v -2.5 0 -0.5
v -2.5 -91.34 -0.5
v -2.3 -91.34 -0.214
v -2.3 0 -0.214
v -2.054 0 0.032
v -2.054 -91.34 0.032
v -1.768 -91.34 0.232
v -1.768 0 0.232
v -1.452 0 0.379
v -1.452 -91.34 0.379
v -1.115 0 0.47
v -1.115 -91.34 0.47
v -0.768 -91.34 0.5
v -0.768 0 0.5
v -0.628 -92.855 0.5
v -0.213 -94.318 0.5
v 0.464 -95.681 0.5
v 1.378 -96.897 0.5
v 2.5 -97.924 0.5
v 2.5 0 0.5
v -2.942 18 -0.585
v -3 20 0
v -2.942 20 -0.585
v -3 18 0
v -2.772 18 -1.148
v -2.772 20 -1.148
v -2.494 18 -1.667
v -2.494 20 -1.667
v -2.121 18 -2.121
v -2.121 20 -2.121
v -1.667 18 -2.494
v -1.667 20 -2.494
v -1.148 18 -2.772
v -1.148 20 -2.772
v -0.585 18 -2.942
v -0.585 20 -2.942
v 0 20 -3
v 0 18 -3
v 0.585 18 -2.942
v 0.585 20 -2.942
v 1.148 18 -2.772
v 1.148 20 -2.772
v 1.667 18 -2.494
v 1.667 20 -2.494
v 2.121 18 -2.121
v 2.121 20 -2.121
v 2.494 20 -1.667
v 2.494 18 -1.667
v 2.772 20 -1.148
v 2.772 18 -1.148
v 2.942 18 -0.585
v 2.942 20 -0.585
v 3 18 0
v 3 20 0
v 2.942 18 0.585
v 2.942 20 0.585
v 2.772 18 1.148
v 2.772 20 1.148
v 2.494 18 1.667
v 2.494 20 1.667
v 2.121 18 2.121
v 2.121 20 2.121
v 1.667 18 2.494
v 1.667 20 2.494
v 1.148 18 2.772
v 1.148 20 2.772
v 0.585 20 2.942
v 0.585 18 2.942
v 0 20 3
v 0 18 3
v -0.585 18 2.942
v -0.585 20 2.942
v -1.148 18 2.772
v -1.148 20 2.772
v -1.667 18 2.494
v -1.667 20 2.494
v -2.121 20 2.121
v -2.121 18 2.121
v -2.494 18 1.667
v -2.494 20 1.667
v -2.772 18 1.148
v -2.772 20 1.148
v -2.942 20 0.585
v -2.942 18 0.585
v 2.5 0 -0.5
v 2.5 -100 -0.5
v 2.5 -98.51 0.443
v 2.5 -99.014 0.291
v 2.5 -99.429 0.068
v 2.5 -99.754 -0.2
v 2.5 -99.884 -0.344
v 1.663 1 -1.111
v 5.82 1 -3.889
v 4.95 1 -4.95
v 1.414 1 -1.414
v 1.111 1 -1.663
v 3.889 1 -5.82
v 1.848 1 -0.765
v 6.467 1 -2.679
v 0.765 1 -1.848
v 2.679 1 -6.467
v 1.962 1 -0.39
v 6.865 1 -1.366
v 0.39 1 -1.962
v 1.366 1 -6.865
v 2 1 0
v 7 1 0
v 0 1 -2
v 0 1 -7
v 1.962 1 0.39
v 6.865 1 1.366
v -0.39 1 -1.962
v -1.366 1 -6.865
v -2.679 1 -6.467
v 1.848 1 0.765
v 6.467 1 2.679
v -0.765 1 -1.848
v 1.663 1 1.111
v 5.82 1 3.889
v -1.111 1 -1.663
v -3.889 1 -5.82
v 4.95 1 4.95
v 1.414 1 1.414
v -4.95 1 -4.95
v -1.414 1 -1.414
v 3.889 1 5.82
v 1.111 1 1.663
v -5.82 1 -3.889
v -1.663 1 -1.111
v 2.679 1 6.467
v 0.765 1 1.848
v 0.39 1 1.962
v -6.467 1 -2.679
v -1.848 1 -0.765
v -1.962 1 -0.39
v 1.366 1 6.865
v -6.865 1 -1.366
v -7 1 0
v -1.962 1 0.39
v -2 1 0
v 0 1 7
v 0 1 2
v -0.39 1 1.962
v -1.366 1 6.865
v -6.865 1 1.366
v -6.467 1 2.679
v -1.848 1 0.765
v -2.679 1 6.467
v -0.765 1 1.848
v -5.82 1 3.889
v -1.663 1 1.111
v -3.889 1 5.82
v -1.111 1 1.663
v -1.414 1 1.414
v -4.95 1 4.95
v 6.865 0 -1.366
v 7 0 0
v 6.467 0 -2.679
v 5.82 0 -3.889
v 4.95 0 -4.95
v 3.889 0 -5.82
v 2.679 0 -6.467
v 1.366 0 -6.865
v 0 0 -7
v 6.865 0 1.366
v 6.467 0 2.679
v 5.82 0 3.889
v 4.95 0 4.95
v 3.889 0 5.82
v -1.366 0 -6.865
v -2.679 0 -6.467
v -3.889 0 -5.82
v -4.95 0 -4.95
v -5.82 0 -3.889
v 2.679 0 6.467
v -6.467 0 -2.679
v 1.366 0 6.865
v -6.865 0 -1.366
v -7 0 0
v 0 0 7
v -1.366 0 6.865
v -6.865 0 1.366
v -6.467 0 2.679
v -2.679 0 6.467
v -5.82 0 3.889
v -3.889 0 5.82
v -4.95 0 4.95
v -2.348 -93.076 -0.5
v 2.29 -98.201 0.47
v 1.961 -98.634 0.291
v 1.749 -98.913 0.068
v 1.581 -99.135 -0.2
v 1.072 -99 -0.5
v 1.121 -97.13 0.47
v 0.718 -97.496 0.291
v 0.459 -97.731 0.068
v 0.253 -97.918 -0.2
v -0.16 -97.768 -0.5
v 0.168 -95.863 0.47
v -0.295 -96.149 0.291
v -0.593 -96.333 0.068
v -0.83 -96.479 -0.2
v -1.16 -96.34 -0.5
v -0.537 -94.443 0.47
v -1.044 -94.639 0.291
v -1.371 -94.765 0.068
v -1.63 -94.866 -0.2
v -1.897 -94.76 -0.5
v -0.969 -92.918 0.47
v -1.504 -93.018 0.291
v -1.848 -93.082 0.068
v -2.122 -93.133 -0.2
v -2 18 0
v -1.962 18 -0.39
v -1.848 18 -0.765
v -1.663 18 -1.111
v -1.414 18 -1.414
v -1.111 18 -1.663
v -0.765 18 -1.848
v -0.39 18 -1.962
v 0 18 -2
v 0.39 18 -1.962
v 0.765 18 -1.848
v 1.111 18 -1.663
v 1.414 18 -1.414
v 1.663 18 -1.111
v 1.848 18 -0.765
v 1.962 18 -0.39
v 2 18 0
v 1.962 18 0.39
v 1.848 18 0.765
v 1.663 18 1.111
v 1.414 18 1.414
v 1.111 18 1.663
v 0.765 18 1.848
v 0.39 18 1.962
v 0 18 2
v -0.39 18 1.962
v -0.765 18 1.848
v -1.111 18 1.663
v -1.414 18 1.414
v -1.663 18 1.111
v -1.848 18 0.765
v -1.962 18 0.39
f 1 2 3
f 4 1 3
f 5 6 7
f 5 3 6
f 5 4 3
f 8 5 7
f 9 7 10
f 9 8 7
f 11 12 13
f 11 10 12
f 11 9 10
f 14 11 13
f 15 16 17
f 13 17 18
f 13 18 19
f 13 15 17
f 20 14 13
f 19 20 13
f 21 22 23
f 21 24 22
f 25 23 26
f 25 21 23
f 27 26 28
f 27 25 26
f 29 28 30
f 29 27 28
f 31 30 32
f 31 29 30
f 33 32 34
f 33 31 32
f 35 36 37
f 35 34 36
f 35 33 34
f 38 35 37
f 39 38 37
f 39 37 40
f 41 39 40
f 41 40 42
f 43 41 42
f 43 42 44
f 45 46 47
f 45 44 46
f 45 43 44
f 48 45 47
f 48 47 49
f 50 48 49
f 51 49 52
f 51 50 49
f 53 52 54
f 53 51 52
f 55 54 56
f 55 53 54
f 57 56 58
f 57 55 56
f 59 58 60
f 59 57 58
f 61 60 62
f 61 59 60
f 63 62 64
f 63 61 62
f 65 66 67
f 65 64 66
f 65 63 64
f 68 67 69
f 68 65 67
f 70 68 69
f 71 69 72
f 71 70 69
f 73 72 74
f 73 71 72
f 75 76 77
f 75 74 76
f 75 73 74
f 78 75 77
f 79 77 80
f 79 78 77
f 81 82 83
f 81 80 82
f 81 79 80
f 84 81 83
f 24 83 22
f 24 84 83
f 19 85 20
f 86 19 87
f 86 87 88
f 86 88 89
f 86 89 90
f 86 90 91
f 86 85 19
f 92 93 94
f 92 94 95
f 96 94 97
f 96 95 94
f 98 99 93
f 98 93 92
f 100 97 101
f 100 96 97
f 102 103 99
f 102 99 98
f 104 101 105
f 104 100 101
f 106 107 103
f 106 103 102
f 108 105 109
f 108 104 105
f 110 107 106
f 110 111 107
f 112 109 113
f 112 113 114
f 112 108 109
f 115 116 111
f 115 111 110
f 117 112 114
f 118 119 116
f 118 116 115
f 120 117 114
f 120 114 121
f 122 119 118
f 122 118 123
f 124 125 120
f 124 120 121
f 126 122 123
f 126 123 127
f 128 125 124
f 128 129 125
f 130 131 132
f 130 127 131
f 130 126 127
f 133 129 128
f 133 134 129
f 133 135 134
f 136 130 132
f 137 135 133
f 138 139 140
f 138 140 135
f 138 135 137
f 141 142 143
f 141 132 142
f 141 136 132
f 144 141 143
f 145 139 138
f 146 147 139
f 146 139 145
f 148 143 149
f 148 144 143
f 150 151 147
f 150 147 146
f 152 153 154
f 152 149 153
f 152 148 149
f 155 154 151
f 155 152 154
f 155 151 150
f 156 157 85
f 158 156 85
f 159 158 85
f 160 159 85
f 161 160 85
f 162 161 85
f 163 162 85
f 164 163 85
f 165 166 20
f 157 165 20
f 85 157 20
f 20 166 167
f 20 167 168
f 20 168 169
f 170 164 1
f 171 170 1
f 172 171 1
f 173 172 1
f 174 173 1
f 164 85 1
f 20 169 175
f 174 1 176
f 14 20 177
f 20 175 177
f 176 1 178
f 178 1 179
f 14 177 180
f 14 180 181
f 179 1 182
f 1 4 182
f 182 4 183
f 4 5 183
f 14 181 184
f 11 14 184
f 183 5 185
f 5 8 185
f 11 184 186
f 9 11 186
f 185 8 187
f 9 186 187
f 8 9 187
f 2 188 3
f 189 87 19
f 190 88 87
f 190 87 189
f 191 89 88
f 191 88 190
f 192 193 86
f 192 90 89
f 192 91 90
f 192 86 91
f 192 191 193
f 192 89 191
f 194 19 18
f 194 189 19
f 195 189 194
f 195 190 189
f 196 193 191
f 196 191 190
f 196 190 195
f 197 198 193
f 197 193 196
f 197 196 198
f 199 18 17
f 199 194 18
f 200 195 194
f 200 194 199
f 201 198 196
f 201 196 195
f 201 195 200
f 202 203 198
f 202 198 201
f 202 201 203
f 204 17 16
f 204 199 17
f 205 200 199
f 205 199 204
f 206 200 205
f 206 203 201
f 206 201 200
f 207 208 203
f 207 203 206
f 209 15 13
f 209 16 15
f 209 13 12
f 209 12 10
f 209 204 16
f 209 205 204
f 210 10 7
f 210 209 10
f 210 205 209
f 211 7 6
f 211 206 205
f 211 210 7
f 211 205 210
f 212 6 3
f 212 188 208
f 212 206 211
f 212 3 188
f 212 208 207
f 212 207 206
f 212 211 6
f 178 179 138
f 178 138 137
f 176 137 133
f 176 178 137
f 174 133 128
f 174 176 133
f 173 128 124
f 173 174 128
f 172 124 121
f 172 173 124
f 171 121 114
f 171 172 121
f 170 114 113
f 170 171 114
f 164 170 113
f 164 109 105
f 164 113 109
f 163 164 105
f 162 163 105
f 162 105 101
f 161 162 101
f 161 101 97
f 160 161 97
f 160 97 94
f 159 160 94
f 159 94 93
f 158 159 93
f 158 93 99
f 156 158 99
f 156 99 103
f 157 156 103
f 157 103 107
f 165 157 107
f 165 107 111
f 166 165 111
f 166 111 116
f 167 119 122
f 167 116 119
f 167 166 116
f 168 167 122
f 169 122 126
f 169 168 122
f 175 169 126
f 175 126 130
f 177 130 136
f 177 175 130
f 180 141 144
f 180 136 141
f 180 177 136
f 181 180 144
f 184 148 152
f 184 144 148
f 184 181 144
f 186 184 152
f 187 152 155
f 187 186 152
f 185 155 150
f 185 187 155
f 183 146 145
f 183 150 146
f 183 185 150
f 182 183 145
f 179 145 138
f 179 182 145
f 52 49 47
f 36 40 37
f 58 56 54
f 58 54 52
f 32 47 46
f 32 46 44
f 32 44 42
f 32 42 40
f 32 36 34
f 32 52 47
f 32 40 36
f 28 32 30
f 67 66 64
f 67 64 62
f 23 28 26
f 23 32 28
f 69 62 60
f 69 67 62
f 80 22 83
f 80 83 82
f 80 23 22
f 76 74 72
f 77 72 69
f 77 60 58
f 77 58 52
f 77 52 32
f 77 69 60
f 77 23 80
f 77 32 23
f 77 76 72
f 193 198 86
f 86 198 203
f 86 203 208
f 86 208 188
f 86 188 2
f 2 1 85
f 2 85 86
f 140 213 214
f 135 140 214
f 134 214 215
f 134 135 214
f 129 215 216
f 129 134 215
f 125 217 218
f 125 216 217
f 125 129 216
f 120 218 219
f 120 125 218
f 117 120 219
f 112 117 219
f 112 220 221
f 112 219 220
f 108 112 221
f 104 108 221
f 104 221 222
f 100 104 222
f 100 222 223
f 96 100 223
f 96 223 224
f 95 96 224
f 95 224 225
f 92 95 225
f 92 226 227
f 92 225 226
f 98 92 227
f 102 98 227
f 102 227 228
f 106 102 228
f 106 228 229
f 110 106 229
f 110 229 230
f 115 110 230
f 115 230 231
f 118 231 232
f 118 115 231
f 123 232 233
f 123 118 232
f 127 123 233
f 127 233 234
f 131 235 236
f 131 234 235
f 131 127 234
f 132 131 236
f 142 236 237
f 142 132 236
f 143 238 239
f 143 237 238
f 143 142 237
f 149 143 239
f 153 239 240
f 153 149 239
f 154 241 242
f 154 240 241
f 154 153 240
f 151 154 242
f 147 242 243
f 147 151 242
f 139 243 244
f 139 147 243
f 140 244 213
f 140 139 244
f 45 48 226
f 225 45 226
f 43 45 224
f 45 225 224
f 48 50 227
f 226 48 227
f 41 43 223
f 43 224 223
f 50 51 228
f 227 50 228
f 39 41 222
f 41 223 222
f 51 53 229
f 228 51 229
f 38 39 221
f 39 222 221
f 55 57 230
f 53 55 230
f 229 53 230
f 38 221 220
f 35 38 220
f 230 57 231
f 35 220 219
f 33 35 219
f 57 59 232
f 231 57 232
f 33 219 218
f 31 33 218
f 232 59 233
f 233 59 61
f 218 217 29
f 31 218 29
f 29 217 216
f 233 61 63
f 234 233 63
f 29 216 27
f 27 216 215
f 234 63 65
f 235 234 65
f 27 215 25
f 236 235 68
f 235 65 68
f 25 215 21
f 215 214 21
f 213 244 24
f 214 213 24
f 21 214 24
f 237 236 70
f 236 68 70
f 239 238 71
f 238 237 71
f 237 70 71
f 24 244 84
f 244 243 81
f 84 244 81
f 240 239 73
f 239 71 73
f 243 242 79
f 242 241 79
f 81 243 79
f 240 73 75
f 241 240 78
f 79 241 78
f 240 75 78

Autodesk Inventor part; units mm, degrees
ref_plane "YZ Plane" through (0, 0, 0) normal (1, 0, 0) x (0, 1, 0)
ref_plane "XZ Plane" through (0, 0, 0) normal (0, 1, 0) x (-1, 0, 0)
ref_plane "XY Plane" through (0, 0, 0) normal (0, 0, 1) x (1, 0, 0)
sketch "Esboço1" plane through (0, 0, 0) normal (0, 0, 1) x (1, 0, 0)
  line L0 (-3, 20) -> (0, 20)
  line L1 (-3, 20) -> (-3, 18)
  line L2 (-3, 18) -> (-2, 18)
  line L3 (-2, 18) -> (-2, 1)
  line L4 (-2, 1) -> (-7, 1)
  line L5 (-7, 1) -> (-7, 0)
  line L6 (-7, 0) -> (0, 0)
  line L7 (0, 20) -> (0, 0)
  line L8 (-8.4, 0) -> (1.4, 0) projected
  line L9 (0, -4) -> (0, 24) projected
  dimension "d0" = 20
  dimension "d1" = 3
  dimension "d2" = 2
  dimension "d3" = 1
  dimension "d4" = 5
  dimension "d5" = 1
revolve "Revolução1" add sketch "Esboço1" angle 360 about axis through (0, -10, 0) along (0, 1, 0)
sketch "Esboço2" plane through (0, 0, 0) normal (0, 0, 1) x (1, 0, 0)
  line L0 (-2.5, 0) -> (2.5, 0)
  line L1 (2.5, 0) -> (2.5, -100)
  line L2 (2.5, -100) -> (2.5, -64.1353)
  arc A0 (-2.5, -91.3397) -> (2.5, -100) centre (7.5, -91.3397) ccw
  line L3 (-2.5, 0) -> (-2.5, -91.3397)
  line L4 (7, 0) -> (-7, 0) projected
  point P0 (0, 0)
  point P1 (0, 0)
  dimension "d7" = 100
  dimension "d8" = 5
  dimension "d10" = 10
extrude "Extrusão1" add sketch "Esboço2" along normal mid plane 1
fillet "Arredondamento1" radius 2 2 edges at (-1.1603, -96.3397, 0.5) (-2.5, -45.6699, 0.5)
properties part number "katana"
